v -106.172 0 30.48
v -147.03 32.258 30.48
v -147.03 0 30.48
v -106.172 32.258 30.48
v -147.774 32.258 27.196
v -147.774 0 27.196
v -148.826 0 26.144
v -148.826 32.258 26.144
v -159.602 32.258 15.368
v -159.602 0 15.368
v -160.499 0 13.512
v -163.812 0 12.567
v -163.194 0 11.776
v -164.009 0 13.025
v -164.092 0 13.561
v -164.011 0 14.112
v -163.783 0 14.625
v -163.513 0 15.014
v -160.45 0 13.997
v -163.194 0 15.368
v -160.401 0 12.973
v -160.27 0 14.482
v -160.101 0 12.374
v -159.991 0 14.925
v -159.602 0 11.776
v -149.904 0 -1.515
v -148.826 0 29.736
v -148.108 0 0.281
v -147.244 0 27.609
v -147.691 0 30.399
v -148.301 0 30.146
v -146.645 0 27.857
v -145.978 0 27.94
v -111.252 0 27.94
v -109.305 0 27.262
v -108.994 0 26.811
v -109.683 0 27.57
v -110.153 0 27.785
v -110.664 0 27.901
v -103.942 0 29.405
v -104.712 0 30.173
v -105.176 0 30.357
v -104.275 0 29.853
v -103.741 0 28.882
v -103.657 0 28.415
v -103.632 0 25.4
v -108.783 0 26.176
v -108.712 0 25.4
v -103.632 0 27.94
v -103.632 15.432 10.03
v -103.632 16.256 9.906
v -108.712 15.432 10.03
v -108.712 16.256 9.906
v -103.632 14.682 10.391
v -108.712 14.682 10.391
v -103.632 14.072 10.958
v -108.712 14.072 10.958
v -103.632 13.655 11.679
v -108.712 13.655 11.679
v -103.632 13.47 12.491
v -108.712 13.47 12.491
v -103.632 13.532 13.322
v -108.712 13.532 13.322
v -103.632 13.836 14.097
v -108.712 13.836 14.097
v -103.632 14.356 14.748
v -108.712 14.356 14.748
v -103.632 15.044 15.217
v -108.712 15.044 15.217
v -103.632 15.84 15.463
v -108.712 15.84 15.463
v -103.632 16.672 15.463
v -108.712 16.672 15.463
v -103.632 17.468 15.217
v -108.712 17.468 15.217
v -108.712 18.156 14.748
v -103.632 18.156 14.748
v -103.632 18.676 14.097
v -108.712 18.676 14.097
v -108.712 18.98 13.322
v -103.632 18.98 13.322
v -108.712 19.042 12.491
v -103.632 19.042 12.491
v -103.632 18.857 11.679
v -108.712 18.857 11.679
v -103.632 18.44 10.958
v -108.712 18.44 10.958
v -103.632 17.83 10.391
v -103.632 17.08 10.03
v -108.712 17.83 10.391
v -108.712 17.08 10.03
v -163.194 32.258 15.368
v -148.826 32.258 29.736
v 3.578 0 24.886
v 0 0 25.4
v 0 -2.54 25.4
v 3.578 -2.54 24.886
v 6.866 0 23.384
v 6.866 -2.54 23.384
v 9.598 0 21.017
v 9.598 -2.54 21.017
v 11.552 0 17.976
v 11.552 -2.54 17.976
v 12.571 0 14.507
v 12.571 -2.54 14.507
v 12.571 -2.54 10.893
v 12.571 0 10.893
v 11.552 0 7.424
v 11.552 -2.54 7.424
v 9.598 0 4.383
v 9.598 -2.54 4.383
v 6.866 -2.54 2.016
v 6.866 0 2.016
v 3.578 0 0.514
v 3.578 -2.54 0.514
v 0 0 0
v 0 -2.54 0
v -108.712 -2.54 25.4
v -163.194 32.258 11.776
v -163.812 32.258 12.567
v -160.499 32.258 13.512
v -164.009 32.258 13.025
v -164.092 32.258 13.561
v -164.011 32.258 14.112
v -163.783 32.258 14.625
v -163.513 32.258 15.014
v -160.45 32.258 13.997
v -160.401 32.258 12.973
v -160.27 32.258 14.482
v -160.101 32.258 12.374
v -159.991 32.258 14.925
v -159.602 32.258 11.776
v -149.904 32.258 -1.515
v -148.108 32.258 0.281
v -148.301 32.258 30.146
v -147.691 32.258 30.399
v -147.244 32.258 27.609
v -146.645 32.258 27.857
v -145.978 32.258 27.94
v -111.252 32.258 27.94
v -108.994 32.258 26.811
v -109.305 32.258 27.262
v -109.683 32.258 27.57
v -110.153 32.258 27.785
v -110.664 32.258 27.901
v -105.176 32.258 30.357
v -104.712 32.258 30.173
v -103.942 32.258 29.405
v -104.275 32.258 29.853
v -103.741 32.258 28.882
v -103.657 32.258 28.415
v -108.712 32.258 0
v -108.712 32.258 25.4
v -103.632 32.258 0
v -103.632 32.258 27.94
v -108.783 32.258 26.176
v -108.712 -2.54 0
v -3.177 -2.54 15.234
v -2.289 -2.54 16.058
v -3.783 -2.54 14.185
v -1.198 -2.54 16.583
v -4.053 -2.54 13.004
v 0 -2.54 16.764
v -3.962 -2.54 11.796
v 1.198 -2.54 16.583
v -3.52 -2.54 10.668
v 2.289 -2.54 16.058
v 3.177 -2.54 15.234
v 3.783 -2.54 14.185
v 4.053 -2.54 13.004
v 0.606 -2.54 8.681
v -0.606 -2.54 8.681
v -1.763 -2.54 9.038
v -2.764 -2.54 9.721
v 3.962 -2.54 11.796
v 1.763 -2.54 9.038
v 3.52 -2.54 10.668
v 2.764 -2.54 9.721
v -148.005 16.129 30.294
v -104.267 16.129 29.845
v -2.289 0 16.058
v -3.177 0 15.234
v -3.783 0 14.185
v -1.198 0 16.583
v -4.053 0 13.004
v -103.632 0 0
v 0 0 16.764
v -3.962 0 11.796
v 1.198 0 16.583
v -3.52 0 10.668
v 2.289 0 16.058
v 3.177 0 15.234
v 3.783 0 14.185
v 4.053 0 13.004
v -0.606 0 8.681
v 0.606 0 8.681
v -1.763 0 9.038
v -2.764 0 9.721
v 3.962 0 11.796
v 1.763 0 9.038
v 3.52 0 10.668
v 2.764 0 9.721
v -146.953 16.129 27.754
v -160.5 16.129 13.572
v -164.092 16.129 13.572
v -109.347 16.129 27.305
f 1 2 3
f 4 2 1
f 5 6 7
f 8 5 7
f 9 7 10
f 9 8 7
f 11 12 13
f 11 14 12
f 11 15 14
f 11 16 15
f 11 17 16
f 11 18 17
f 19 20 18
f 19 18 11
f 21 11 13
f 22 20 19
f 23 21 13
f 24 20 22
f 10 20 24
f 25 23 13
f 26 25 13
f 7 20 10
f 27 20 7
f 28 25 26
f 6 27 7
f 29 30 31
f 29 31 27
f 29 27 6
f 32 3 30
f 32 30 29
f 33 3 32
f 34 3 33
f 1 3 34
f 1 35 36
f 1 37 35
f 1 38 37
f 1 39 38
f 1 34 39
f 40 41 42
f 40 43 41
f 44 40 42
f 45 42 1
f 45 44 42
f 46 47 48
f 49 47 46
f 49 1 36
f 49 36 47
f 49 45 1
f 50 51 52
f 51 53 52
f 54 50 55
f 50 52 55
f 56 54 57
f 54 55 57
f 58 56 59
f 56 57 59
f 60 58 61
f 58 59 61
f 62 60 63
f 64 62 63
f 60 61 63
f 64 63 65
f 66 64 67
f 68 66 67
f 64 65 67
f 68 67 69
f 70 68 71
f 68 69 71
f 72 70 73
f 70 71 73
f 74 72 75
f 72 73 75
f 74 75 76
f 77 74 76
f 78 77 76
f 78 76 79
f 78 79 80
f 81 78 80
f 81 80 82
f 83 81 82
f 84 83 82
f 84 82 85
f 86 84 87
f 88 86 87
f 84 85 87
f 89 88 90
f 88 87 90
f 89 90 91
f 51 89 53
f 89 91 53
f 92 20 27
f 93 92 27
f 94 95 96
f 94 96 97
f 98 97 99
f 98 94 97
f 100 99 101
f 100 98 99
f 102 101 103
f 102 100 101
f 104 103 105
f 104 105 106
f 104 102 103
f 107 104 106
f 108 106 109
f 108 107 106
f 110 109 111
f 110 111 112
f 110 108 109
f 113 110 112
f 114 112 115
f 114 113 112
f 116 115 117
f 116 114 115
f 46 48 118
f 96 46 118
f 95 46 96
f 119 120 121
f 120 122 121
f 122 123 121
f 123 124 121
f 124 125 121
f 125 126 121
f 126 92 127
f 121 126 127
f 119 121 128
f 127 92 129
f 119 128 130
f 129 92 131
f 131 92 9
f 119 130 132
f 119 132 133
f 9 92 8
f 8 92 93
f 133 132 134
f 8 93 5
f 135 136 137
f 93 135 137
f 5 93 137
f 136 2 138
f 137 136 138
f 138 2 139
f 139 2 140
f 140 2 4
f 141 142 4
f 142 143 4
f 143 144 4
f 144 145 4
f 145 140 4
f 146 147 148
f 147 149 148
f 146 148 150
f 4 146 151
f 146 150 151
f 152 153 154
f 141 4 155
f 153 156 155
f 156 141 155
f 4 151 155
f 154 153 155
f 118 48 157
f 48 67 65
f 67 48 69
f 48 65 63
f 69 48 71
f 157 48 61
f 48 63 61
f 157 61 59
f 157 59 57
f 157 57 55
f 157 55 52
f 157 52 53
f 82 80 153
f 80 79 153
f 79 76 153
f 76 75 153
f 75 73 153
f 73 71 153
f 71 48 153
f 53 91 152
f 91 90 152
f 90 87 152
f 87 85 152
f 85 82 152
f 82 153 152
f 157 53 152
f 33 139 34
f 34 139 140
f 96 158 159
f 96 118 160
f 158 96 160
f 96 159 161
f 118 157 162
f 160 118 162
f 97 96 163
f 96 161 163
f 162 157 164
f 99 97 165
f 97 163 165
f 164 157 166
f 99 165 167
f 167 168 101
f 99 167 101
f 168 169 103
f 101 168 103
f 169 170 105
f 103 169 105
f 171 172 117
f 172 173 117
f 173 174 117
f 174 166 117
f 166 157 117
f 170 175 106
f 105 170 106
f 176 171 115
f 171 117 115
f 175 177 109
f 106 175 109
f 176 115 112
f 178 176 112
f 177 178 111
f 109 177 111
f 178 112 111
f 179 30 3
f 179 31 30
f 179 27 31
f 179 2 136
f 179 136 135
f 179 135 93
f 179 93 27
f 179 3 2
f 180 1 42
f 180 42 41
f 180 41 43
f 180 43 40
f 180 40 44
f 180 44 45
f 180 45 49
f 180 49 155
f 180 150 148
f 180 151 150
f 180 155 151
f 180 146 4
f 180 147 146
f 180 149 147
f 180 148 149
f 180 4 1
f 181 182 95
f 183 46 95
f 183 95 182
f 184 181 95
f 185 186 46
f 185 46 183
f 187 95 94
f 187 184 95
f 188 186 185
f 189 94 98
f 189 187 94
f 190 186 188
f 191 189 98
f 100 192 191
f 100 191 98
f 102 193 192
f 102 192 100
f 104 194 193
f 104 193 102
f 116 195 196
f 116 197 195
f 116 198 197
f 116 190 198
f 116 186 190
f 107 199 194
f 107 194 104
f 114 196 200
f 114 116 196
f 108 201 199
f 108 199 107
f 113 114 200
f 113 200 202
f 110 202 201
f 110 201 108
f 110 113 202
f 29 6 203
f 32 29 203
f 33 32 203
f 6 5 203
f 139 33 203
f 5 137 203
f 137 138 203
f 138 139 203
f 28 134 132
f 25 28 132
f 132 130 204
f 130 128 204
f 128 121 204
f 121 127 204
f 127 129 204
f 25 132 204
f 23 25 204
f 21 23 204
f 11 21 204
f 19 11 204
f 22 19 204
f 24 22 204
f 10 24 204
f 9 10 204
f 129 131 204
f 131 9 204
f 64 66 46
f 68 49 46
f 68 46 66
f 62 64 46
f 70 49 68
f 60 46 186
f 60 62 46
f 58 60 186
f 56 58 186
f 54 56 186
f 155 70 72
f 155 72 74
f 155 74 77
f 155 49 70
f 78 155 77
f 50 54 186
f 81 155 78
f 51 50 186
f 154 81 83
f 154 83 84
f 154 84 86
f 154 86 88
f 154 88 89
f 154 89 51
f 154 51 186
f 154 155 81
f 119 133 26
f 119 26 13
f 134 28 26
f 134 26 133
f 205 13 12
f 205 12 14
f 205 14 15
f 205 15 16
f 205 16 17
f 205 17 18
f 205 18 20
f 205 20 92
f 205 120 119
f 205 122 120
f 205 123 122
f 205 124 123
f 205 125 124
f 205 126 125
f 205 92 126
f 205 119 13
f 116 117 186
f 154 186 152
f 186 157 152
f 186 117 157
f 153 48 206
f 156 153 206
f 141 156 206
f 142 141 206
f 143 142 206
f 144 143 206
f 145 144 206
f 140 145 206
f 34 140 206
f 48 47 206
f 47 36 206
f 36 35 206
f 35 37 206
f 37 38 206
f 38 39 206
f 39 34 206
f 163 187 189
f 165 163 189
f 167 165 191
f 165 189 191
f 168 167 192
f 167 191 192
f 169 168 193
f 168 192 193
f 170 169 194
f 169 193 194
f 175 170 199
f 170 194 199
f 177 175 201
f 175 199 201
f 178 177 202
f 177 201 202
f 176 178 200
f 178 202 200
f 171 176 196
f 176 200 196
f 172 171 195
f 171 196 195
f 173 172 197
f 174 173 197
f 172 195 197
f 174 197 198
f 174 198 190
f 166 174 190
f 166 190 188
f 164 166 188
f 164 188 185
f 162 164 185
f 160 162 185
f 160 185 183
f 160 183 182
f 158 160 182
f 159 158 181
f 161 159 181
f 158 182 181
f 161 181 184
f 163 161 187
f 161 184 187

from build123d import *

# Parameters (mm, degrees)
SKETCH1_R                   = 4.064
BOSS_EXTRUDE1_DEPTH         = 2.54
SKETCH2_W                   = 30.48
SKETCH2_H                   = 32.258
BOSS_EXTRUDE2_DEPTH         = 5.08
SKETCH3_W                   = 41.91
SKETCH3_H                   = 32.258
BOSS_EXTRUDE3_DEPTH         = 2.54
FILLET1_SIZE                = 2.54
CUT_EXTRUDE1_DEPTH          = 158.565599432
SKETCH5_W                   = 17.78
SKETCH5_H                   = 32.258
BOSS_EXTRUDE4_DEPTH         = 2.54
BOSS_EXTRUDE5_DEPTH         = 32.258
SKETCH9_W                   = 18.796
SKETCH9_H                   = 32.258
BOSS_EXTRUDE6_DEPTH         = 2.54
BOSS_EXTRUDE7_DEPTH         = 32.258
FILLET3_SIZE                = 2.54
W_0_22_DIAMETER_HOLE1_D     = 5.588
W_0_22_DIAMETER_HOLE1_DEPTH = 5.08
W_0_22_DIAMETER_HOLE1_TIP   = 1.67880457


with BuildPart() as part:
    # Sketch1 → Boss-Extrude1 (new body)
    with BuildSketch(Plane(origin=(0, 0, 0), x_dir=(1, 0, 0), z_dir=(0, 1, 0))):
        with BuildLine():
            Line((0, 0), (-108.712, 0))
            Line((-108.712, 0), (-108.712, -25.4))
            Line((-108.712, -25.4), (0, -25.4))
            ThreePointArc((0, -25.4), (12.7, -12.7), (0, 0))
        make_face()
        with Locations(Location((0, -12.7, 0), (0, 0, 270))):
            Circle(SKETCH1_R, mode=Mode.SUBTRACT)
    extrude(amount=-BOSS_EXTRUDE1_DEPTH)

    # Sketch2 → Boss-Extrude2 (add)
    with BuildSketch(Plane(origin=(-108.712, 0, 0), x_dir=(0, 0, -1), z_dir=(1, 0, 0))):
        with Locations((-15.24, 16.129)):
            Rectangle(SKETCH2_W, SKETCH2_H)
    extrude(amount=BOSS_EXTRUDE2_DEPTH)

    # Sketch3 → Boss-Extrude3 (add)
    with BuildSketch(Plane.XY.offset(30.48)):
        with Locations((-129.667, 16.129)):
            Rectangle(SKETCH3_W, SKETCH3_H)
    extrude(amount=-BOSS_EXTRUDE3_DEPTH)

    # Fillet1
    # a fillet whose section is not a circle: 2.54 mm, written as the material it adds along each edge
    with BuildSketch(Plane(origin=(-108.712, 0, 27.94), x_dir=(0, 0, -1), z_dir=(0, 1, 0))) as fillet1_piece_1:
        with BuildLine():
            Bezier((FILLET1_SIZE, 0), (0, 0), (0, FILLET1_SIZE), weights=[1, 1, 1])
            Line((0, FILLET1_SIZE), (0, 0))
            Line((0, 0), (FILLET1_SIZE, 0))
        make_face()
    extrude(amount=32.258)
    # a fillet whose section is not a circle: 2.54 mm, written as the material it takes off along each edge
    with BuildSketch(Plane(origin=(-103.632, -6.35, 30.48), x_dir=(0, 0, -1), z_dir=(0, 1, 0))) as fillet1_2_piece_1:
        with BuildLine():
            Bezier((FILLET1_SIZE, 0), (0, 0), (0, FILLET1_SIZE), weights=[1, 1, 1])
            Line((0, FILLET1_SIZE), (0, 0))
            Line((0, 0), (FILLET1_SIZE, 0))
        make_face()
    extrude(amount=44.958, mode=Mode.SUBTRACT)

    # Sketch4 → Cut-Extrude1 (cut, through all)
    with BuildSketch(Plane(origin=(0, 32.258, 0), x_dir=(1, 0, 0), z_dir=(0, 1, 0))):
        Polygon((-150.622, -27.94), (-148.082, -30.48), (-150.622, -30.48), align=None)
    extrude(amount=-CUT_EXTRUDE1_DEPTH, mode=Mode.SUBTRACT)



with BuildPart() as body_2:
    # Sketch5 → Boss-Extrude4 (new body)
    with BuildSketch(Plane(origin=(-89.281, 0, 89.281), x_dir=(0.7071067811865327, 0, 0.7071067811865624), z_dir=(-0.7071067811865624, 0, 0.7071067811865327))):
        with Locations((-95.63927413, 16.129)):
            Rectangle(SKETCH5_W, SKETCH5_H)
    extrude(amount=-BOSS_EXTRUDE4_DEPTH)


with BuildPart() as part_1:
    add(part.part)

    add(body_2.part)  # Boss-Extrude5 merges body 2
    # Sketch6 → Boss-Extrude5 (add)
    with BuildSketch(Plane(origin=(0, 32.258, 0), x_dir=(1, 0, 0), z_dir=(0, 1, 0))):
        Polygon((-150.622, -27.94), (-147.029897552, -27.94), (-148.825948776, -26.143948776), align=None)
    extrude(amount=-BOSS_EXTRUDE5_DEPTH)

    # Fillet2
    # a fillet whose section is not a circle: 2.54 mm, written as the material it adds along each edge
    with BuildSketch(Plane(origin=(-147.029897552, 32.258, 27.94), x_dir=(-0.7071067811865357, 0, -0.7071067811865592), z_dir=(0, -1, 0))) as fillet2_piece_1:
        with BuildLine():
            Bezier((1.052102448, 0), (0, 0), (-0.743948776, 0.743948776), weights=[1, 1, 1])
            Line((-0.743948776, 0.743948776), (0, 0))
            Line((0, 0), (1.052102448, 0))
        make_face()
    extrude(amount=32.258)
    # a fillet whose section is not a circle: 2.54 mm, written as the material it takes off along each edge
    with BuildSketch(Plane(origin=(-148.082, 34.888256121, 30.48), x_dir=(-0.707106781186539, 0, -0.707106781186556), z_dir=(0, -1, 0))) as fillet2_2_piece_1:
        with BuildLine():
            Bezier((1.052102448, 0), (0, 0), (-0.743948776, 0.743948776), weights=[1, 1, 1])
            Line((-0.743948776, 0.743948776), (0, 0))
            Line((0, 0), (1.052102448, 0))
        make_face()
    extrude(amount=37.518512242, mode=Mode.SUBTRACT)



with BuildPart() as body_2_2:
    # Sketch9 → Boss-Extrude6 (new body)
    with BuildSketch(Plane(origin=(-73.913358569, 0, -73.913358569), x_dir=(-0.7071067811865623, 0, 0.7071067811865328), z_dir=(-0.7071067811865328, 0, -0.7071067811865623))):
        with Locations((114.324401062, 16.129)):
            Rectangle(SKETCH9_W, SKETCH9_H)
    extrude(amount=BOSS_EXTRUDE6_DEPTH)


with BuildPart() as part_2:
    add(part_1.part)

    add(body_2_2.part)  # Boss-Extrude7 merges body 2 2
    # Sketch10 → Boss-Extrude7 (add)
    with BuildSketch(Plane(origin=(0, 0, 0), x_dir=(1, 0, 0), z_dir=(0, 1, 0))):
        Polygon((-161.398307345, -13.571590206), (-163.194358569, -11.775538982), (-164.990409794, -13.571590206), (-163.194358569, -15.367641431), align=None)
    extrude(amount=BOSS_EXTRUDE7_DEPTH)

    # Fillet3
    # a fillet whose section is not a circle: 2.54 mm, written as the material it adds along each edge
    with BuildSketch(Plane(origin=(-161.398307345, 32.258, 13.571590206), x_dir=(0.7071067811865611, 0, -0.7071067811865339), z_dir=(0, -1, 0))) as fillet3_piece_1:
        with BuildLine():
            Bezier((FILLET3_SIZE, 0), (0, 0), (0, FILLET3_SIZE), weights=[1, 1, 1])
            Line((0, FILLET3_SIZE), (0, 0))
            Line((0, 0), (FILLET3_SIZE, 0))
        make_face()
    extrude(amount=32.258)
    # a fillet whose section is not a circle: 2.54 mm, written as the material it takes off along each edge
    with BuildSketch(Plane(origin=(-164.990409794, -6.35, 13.571590206), x_dir=(0.7071067811865199, 0, 0.7071067811865752), z_dir=(0, 1, 0))) as fillet3_2_piece_1:
        with BuildLine():
            Bezier((FILLET3_SIZE, 0), (0, 0), (0, FILLET3_SIZE), weights=[1, 1, 1])
            Line((0, FILLET3_SIZE), (0, 0))
            Line((0, 0), (FILLET3_SIZE, 0))
        make_face()
    extrude(amount=44.958, mode=Mode.SUBTRACT)

    # W (0.22) Diameter Hole1
    with Locations(Plane(origin=(-103.632, 16.256, 12.7), x_dir=(0, 0, 1), z_dir=(1, 0, 0))):
        with Locations((0, 0)):
            Hole(W_0_22_DIAMETER_HOLE1_D / 2, depth=W_0_22_DIAMETER_HOLE1_DEPTH)
            with Locations((0, 0, -(W_0_22_DIAMETER_HOLE1_DEPTH + W_0_22_DIAMETER_HOLE1_TIP / 2))):  # 118° drill point
                Cone(0, W_0_22_DIAMETER_HOLE1_D / 2, W_0_22_DIAMETER_HOLE1_TIP, mode=Mode.SUBTRACT)


solid = part_2.part
